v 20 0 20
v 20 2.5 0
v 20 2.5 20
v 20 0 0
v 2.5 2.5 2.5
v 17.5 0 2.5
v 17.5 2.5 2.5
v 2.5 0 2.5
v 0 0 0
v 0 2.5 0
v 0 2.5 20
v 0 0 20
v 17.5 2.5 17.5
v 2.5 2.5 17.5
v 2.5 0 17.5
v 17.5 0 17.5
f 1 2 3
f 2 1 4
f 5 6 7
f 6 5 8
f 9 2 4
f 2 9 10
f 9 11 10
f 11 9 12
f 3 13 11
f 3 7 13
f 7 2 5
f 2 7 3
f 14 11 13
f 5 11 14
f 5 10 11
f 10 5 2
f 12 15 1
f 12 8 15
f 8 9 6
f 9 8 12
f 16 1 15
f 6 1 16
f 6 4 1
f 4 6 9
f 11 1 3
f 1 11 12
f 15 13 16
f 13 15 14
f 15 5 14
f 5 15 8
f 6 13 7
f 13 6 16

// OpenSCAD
// U-shaped spring clip.
$fn = 60;
eps = 0.02;
clip_w = 20;
clip_h = 20;
clip_t = 2.5;
union() { cube([clip_w,clip_t,clip_t]); translate([0,0,clip_h-clip_t]) cube([clip_w,clip_t,clip_t]); cube([clip_t,clip_t,clip_h]); translate([clip_w-clip_t,0,0]) cube([clip_t,clip_t,clip_h]); }
